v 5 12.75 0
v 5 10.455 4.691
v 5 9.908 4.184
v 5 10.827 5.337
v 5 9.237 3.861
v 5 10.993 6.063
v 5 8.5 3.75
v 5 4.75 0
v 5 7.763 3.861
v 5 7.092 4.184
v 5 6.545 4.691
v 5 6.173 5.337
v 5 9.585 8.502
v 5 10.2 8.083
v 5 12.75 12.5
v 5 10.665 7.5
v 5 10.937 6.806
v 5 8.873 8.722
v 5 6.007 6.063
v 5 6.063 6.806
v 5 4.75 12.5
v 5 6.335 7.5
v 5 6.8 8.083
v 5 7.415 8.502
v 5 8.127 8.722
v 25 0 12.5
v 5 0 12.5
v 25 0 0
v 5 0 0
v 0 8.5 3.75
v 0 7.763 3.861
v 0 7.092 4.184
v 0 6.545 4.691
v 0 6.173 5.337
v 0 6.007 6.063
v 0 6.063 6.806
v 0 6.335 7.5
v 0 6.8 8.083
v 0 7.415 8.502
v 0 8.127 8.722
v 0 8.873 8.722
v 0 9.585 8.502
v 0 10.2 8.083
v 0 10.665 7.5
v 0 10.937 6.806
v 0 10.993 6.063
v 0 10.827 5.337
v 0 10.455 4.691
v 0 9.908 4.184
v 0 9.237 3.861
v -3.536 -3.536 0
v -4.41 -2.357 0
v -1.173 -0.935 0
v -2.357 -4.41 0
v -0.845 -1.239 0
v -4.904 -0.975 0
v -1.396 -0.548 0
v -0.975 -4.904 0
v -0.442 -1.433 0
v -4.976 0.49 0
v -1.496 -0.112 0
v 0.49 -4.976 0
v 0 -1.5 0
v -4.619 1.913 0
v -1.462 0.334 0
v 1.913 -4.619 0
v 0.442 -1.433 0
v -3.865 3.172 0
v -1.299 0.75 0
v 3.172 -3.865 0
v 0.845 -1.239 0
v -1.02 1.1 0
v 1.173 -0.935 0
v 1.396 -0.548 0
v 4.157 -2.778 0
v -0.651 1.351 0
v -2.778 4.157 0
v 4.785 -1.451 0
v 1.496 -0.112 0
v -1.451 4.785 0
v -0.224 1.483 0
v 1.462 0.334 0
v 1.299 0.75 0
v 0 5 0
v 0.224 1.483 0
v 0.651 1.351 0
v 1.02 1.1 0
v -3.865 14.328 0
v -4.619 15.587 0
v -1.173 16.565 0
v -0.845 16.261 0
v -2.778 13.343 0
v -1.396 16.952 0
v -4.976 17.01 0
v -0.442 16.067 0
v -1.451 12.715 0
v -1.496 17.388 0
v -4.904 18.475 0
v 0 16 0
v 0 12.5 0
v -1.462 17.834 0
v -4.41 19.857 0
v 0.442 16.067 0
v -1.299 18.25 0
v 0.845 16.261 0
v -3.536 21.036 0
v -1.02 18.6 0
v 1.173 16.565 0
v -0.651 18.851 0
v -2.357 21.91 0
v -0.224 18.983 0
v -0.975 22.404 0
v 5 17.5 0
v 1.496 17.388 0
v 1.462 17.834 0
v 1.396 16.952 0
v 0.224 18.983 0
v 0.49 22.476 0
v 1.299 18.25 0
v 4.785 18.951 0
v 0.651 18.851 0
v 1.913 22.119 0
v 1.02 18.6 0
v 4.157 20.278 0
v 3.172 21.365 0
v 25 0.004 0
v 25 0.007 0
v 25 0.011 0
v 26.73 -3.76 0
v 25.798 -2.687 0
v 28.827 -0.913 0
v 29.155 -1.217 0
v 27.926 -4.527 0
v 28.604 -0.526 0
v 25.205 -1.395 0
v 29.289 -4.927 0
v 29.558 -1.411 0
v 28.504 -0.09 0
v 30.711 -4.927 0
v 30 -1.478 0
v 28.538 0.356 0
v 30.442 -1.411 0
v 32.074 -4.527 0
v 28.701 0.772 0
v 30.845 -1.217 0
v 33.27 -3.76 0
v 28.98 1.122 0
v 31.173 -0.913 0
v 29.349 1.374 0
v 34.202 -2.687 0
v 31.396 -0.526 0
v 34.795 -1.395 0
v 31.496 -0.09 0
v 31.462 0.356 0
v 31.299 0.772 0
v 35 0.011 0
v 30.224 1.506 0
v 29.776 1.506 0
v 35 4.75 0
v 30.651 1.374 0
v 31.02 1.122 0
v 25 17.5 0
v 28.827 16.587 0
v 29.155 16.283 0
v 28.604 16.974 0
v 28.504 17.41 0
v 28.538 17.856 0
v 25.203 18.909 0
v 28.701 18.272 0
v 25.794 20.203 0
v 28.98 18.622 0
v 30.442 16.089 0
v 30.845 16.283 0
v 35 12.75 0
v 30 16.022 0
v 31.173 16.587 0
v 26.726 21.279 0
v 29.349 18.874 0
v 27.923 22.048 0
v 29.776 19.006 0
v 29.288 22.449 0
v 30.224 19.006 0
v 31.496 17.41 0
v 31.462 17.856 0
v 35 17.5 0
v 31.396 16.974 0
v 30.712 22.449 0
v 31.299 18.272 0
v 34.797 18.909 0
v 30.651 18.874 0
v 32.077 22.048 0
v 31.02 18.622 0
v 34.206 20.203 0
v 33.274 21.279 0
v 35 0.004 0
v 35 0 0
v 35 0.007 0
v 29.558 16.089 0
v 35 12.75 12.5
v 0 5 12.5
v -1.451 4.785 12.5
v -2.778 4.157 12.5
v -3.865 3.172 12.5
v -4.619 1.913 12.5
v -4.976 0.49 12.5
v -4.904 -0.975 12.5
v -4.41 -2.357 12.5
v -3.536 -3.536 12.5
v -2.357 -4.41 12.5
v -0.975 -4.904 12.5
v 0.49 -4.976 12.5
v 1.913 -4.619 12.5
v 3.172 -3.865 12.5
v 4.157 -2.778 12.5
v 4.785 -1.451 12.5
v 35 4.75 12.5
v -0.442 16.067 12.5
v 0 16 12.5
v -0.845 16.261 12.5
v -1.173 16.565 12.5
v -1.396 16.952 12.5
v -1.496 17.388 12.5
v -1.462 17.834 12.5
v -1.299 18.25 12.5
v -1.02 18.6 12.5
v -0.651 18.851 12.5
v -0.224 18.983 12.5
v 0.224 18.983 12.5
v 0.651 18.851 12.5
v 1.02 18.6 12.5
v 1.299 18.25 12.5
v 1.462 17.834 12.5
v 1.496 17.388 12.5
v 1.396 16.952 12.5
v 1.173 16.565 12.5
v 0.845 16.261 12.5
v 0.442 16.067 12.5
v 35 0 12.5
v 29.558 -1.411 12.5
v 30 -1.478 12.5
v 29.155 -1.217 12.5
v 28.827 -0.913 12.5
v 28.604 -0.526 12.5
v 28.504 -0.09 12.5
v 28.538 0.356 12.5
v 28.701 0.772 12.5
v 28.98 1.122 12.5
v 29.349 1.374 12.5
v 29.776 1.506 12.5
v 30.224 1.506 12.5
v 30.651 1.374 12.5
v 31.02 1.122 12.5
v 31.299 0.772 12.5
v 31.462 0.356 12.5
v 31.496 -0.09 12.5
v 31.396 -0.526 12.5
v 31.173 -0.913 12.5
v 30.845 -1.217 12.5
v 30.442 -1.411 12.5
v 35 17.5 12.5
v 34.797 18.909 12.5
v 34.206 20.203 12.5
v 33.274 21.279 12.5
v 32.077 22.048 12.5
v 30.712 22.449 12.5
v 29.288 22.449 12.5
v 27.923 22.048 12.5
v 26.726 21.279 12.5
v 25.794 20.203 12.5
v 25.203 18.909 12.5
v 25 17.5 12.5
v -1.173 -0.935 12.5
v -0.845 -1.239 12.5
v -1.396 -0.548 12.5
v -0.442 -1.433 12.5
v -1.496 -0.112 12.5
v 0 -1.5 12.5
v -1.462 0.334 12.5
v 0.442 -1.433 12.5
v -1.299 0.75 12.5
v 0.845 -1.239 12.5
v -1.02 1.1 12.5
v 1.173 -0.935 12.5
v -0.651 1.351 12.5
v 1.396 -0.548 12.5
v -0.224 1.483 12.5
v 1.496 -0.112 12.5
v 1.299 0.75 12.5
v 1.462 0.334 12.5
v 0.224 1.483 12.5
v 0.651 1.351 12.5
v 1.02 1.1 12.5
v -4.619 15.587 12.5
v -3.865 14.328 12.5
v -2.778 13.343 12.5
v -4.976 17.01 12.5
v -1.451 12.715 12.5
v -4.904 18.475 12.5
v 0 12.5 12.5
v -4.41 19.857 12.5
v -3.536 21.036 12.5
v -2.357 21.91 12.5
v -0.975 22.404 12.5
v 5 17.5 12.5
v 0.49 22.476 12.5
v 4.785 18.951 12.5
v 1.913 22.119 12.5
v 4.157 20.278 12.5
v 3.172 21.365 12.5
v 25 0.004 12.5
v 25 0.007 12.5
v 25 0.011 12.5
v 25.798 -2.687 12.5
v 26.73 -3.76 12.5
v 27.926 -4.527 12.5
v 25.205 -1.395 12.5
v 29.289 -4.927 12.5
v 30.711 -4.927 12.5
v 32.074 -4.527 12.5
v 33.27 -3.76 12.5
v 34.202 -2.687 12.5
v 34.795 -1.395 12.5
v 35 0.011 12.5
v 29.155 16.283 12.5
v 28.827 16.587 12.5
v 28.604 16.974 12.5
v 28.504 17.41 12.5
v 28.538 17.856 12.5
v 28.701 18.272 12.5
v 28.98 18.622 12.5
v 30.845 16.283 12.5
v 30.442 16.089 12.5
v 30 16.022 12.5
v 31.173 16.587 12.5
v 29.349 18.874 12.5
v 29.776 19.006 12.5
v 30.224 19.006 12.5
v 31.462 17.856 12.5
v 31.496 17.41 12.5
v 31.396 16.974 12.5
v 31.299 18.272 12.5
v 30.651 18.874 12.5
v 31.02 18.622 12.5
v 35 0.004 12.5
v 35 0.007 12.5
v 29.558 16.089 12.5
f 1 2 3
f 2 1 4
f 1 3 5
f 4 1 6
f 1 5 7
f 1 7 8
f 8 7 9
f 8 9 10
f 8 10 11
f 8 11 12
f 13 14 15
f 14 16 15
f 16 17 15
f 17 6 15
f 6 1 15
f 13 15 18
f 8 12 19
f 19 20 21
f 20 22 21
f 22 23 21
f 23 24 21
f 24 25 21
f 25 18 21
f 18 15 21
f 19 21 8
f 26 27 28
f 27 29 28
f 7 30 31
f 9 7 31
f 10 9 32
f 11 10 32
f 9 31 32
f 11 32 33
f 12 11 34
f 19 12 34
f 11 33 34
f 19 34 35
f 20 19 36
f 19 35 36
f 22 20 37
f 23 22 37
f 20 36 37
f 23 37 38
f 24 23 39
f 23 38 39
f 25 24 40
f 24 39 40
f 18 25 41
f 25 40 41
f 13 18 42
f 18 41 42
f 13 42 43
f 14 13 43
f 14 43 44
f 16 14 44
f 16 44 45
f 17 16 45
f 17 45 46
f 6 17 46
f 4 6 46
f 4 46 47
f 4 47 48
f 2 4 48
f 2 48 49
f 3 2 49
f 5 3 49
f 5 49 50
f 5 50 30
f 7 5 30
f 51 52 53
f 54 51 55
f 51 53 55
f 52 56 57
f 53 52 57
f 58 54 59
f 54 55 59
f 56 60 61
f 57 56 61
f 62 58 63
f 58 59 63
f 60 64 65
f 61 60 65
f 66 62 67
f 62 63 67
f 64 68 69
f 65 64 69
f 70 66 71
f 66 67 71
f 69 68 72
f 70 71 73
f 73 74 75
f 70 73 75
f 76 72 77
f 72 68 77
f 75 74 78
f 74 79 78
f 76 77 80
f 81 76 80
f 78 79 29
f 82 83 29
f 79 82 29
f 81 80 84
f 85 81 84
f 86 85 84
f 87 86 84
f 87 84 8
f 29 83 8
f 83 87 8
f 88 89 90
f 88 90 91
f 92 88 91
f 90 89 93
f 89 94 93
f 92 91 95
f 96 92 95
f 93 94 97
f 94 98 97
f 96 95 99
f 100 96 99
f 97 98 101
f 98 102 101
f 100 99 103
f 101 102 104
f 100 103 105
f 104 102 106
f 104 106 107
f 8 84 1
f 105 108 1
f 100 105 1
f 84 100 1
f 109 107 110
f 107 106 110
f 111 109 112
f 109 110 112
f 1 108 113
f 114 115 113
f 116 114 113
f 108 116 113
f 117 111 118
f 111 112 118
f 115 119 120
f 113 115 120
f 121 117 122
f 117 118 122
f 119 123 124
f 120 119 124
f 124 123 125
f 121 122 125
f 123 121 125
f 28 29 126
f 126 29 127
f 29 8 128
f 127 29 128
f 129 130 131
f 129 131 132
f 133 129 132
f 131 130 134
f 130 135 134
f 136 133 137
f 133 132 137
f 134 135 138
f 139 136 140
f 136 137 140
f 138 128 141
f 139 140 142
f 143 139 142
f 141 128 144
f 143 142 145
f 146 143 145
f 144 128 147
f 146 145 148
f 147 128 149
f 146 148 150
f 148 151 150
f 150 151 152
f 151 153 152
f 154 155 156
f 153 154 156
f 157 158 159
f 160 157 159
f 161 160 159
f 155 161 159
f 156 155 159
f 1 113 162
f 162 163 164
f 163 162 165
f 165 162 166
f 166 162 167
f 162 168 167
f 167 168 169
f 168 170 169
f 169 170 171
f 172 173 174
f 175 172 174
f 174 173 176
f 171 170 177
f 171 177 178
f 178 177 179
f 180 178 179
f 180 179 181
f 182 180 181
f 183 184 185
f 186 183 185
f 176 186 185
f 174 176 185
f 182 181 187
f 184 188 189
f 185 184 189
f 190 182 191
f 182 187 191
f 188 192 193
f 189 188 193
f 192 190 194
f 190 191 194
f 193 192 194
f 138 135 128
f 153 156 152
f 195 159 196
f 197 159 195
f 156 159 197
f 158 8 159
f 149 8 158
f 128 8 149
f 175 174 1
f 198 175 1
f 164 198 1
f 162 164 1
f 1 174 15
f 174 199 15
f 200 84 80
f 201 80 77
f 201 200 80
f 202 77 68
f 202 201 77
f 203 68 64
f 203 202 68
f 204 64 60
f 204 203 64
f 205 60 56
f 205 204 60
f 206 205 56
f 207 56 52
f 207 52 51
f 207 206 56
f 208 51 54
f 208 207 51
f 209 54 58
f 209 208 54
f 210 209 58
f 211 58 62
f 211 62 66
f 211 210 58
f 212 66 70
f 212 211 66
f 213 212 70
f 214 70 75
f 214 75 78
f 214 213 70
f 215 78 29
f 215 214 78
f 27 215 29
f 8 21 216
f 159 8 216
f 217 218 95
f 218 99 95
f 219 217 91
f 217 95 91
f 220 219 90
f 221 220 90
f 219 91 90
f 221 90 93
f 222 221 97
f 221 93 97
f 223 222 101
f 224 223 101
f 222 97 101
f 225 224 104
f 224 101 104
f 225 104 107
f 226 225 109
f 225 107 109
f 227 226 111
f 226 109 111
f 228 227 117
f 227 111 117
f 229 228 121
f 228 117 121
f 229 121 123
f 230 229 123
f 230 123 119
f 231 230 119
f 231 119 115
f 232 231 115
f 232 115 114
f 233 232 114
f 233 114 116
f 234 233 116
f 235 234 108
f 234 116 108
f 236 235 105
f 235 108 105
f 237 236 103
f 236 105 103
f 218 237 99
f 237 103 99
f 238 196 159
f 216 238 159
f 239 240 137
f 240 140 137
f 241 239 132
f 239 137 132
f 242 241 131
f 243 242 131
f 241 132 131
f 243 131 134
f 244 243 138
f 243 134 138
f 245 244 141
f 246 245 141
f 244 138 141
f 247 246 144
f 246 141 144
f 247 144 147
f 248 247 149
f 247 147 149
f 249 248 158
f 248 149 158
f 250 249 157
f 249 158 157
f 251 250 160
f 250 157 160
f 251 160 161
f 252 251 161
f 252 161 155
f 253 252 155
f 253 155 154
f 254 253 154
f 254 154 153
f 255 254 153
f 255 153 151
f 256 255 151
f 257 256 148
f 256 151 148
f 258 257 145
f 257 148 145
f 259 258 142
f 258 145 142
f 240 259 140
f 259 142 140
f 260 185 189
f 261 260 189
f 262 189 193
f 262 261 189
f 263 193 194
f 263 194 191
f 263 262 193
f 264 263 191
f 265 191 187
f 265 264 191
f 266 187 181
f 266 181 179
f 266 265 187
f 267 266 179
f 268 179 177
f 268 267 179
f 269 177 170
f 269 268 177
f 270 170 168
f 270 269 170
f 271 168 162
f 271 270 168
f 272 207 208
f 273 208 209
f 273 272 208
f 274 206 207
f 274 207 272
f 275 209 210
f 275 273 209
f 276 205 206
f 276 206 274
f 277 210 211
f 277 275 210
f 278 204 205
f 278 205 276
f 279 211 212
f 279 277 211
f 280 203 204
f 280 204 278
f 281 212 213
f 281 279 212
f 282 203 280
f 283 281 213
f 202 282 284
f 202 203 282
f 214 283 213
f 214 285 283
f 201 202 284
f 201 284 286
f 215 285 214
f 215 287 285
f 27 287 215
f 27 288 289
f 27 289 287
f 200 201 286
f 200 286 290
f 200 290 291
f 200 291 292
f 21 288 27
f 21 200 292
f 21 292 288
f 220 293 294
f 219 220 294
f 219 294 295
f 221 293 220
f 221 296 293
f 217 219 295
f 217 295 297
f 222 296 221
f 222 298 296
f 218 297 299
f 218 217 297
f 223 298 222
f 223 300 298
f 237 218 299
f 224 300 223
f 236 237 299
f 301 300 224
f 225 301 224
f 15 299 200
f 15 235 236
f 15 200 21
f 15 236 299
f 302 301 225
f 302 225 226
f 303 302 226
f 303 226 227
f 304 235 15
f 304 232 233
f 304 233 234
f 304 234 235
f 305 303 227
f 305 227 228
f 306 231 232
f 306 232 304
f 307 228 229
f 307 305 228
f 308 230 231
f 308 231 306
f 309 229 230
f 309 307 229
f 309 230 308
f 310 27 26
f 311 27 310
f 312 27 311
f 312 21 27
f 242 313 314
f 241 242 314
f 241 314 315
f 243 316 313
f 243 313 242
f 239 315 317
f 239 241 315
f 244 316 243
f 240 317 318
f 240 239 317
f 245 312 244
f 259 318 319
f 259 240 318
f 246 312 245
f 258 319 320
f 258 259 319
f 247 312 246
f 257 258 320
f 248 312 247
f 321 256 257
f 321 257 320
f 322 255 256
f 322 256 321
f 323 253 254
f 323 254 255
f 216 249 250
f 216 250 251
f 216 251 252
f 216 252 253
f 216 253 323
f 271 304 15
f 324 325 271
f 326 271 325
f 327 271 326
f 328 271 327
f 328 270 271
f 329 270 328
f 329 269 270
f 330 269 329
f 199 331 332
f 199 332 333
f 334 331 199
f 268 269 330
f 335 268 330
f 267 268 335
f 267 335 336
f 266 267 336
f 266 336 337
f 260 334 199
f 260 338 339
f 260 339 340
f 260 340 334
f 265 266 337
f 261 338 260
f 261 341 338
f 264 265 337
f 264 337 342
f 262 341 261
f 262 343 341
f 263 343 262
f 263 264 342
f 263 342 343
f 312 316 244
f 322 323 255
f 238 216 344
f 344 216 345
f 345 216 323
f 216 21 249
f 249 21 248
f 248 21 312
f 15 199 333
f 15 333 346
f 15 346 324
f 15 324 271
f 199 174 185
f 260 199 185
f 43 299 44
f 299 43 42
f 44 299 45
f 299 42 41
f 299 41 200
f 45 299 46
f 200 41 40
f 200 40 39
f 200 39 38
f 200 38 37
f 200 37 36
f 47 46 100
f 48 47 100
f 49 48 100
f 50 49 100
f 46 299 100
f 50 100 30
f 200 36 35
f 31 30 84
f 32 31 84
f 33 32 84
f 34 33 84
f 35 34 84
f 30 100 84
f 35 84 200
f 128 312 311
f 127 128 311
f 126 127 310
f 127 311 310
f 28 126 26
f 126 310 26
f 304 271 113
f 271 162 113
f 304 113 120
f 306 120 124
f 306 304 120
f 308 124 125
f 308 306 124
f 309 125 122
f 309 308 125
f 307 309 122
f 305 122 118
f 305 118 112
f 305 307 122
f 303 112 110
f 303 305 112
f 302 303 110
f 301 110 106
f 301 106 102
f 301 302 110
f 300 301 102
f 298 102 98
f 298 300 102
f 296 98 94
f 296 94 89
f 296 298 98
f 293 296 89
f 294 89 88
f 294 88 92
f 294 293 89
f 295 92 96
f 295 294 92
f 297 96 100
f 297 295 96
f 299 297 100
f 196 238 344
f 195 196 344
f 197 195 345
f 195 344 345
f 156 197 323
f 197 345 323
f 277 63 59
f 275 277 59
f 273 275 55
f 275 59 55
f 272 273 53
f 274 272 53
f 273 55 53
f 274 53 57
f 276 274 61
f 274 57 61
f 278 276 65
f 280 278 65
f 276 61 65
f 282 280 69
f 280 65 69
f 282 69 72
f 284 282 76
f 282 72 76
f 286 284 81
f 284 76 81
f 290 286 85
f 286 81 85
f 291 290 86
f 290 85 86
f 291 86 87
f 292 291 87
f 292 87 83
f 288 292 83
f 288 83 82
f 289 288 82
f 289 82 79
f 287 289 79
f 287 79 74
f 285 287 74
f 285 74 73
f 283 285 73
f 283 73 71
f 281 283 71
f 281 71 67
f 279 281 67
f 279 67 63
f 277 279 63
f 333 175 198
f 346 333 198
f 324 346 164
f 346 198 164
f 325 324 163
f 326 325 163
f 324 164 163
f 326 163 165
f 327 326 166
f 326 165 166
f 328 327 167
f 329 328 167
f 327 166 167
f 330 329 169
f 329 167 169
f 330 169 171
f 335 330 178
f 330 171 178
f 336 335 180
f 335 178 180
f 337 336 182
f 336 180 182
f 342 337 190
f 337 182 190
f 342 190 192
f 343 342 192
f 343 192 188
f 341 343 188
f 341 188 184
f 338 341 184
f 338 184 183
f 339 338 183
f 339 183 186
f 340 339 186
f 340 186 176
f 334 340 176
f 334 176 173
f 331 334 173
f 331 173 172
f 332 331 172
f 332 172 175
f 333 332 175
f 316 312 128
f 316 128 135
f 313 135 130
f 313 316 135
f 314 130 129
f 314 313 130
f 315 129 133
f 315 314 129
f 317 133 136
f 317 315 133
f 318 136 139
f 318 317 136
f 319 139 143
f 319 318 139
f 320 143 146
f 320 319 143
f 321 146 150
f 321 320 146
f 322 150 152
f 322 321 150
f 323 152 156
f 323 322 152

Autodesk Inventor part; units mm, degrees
ref_plane "YZ Plane" through (0, 0, 0) normal (1, 0, 0) x (0, 1, 0)
ref_plane "XZ Plane" through (0, 0, 0) normal (0, 1, 0) x (-1, 0, 0)
ref_plane "XY Plane" through (0, 0, 0) normal (0, 0, 1) x (1, 0, 0)
sketch "Skizze1" plane through (0, 0, 0) normal (0, 0, 1) x (1, 0, 0)
  line L0 (0, 0) -> (35, 0)
  line L1 (35, 0) -> (35, 17.5)
  line L2 (35, 17.5) -> (0, 17.5)
  line L3 (0, 17.5) -> (0, 0)
  dimension "d0" = 35
  dimension "d1" = 17.5
extrude "Extrusion1" add sketch "Skizze1" along normal blind 12.5
sketch "Skizze2" plane through (0, 0, 12.5) normal (0, 0, 1) x (1, 0, 0)
  line L0 (35, 0) -> (35, 17.5) projected
  line L1 (35, 12.75) -> (5, 12.75)
  line L2 (5, 12.75) -> (5, 4.75)
  line L3 (5, 4.75) -> (35, 4.75)
  line L4 (35, 4.75) -> (35, 12.75)
  line L5 (0, 0) -> (35, 0) projected
  dimension "d4" = 4.75
  dimension "d5" = 4.75
  dimension "d6" = 30
extrude "Extrusion2" cut sketch "Skizze2" against normal blind 12.5
sketch "Skizze3" plane through (0, 0, 12.5) normal (0, 0, 1) x (1, 0, 0)
  circle A0 centre (0, 17.5) radius 5
  circle A1 centre (0, 0) radius 5
  line L0 (0, 0) -> (35, 0) projected
  circle A2 centre (30, 0) radius 5
  line L1 (35, 17.5) -> (0, 17.5) projected
  circle A3 centre (30, 17.5) radius 5
  line L2 (35, 12.75) -> (35, 17.5) projected
  dimension "d9" = 10
  dimension "d10" = 10
  dimension "d11" = 10
  dimension "d12" = 10
extrude "Extrusion3" cut sketch "Skizze3" against normal blind 12.5
sketch "Skizze4" plane through (0, 0, 12.5) normal (0, 0, 1) x (1, 0, 0)
  circle A0 centre (30, 17.5) radius 5
  circle A1 centre (30, 0.0223) radius 5
  circle A2 centre (0, 0) radius 5
  circle A3 centre (0, 17.5) radius 5
  line L0 (0, 12.5) -> (0, 5) projected
  line L1 (5, 4.75) -> (5, 12.75) projected
  dimension "d17" = 10
  dimension "d18" = 10
  dimension "d19" = 10
  dimension "d20" = 10
  dimension "d21" = 30
  dimension "d24" = 25
extrude "Extrusion4" add sketch "Skizze4" against normal blind 12.5
sketch "Skizze5" plane through (0, 0, 12.5) normal (0, 0, 1) x (1, 0, 0)
  arc A0 (25, 0.0111) -> (35, 0.0111) centre (30, 0.0223) ccw projected
  point P0 (0, 0)
  point P1 (0, 0)
  point P2 (0, 17.5)
  point P3 (30, 17.5223)
  dimension "d27" = 17.5
  dimension "d28" = 17.5
  dimension "d29" = 30
sketch "Skizze6" plane through (0, 0, 12.5) normal (0, 0, 1) x (1, 0, 0)
  point P0 (0, 0)
hole "Bohrung1" at (0, 0, 12.5) at (0, 17.5, 12.5) at (30, 17.5223, 12.5) at (30, 0.0223, 12.5) direction (0, 0, -1) diameter 3 end through all
sketch "Skizze8" plane through (5, 4.75, 12.5) normal (1, 0, 0) x (0, 0, -1)
  line L0 (12.5, 8) -> (12.5, 0) projected
  line L1 (12.5, 0) -> (0, 0) projected
  point P0 (12.5, -4.75)
  point P1 (6.25, 3.75)
  dimension "d37" = 6.25
  dimension "d38" = 3.75
hole "Bohrung2" at (5, 8.5, 6.25) direction (-1, 0, 0) diameter 5 end through all
sketch "Skizze9" plane through (5, 4.75, 12.5) normal (1, 0, 0) x (0, 0, -1)
  line L0 (12.5, 0) -> (0, 0) projected
  line L1 (0, 8) -> (12.5, 8) projected
  line L2 (0, 0) -> (12.5, 0)
  line L3 (12.5, 0) -> (12.5, 8)
  line L4 (12.5, 8) -> (0, 8)
  line L5 (0, 8) -> (0, 0)
  point P0 (12.5, -4.75)
extrude "Extrusion5" cut sketch "Skizze9" along normal blind 30
properties part number "halterung_arm"
